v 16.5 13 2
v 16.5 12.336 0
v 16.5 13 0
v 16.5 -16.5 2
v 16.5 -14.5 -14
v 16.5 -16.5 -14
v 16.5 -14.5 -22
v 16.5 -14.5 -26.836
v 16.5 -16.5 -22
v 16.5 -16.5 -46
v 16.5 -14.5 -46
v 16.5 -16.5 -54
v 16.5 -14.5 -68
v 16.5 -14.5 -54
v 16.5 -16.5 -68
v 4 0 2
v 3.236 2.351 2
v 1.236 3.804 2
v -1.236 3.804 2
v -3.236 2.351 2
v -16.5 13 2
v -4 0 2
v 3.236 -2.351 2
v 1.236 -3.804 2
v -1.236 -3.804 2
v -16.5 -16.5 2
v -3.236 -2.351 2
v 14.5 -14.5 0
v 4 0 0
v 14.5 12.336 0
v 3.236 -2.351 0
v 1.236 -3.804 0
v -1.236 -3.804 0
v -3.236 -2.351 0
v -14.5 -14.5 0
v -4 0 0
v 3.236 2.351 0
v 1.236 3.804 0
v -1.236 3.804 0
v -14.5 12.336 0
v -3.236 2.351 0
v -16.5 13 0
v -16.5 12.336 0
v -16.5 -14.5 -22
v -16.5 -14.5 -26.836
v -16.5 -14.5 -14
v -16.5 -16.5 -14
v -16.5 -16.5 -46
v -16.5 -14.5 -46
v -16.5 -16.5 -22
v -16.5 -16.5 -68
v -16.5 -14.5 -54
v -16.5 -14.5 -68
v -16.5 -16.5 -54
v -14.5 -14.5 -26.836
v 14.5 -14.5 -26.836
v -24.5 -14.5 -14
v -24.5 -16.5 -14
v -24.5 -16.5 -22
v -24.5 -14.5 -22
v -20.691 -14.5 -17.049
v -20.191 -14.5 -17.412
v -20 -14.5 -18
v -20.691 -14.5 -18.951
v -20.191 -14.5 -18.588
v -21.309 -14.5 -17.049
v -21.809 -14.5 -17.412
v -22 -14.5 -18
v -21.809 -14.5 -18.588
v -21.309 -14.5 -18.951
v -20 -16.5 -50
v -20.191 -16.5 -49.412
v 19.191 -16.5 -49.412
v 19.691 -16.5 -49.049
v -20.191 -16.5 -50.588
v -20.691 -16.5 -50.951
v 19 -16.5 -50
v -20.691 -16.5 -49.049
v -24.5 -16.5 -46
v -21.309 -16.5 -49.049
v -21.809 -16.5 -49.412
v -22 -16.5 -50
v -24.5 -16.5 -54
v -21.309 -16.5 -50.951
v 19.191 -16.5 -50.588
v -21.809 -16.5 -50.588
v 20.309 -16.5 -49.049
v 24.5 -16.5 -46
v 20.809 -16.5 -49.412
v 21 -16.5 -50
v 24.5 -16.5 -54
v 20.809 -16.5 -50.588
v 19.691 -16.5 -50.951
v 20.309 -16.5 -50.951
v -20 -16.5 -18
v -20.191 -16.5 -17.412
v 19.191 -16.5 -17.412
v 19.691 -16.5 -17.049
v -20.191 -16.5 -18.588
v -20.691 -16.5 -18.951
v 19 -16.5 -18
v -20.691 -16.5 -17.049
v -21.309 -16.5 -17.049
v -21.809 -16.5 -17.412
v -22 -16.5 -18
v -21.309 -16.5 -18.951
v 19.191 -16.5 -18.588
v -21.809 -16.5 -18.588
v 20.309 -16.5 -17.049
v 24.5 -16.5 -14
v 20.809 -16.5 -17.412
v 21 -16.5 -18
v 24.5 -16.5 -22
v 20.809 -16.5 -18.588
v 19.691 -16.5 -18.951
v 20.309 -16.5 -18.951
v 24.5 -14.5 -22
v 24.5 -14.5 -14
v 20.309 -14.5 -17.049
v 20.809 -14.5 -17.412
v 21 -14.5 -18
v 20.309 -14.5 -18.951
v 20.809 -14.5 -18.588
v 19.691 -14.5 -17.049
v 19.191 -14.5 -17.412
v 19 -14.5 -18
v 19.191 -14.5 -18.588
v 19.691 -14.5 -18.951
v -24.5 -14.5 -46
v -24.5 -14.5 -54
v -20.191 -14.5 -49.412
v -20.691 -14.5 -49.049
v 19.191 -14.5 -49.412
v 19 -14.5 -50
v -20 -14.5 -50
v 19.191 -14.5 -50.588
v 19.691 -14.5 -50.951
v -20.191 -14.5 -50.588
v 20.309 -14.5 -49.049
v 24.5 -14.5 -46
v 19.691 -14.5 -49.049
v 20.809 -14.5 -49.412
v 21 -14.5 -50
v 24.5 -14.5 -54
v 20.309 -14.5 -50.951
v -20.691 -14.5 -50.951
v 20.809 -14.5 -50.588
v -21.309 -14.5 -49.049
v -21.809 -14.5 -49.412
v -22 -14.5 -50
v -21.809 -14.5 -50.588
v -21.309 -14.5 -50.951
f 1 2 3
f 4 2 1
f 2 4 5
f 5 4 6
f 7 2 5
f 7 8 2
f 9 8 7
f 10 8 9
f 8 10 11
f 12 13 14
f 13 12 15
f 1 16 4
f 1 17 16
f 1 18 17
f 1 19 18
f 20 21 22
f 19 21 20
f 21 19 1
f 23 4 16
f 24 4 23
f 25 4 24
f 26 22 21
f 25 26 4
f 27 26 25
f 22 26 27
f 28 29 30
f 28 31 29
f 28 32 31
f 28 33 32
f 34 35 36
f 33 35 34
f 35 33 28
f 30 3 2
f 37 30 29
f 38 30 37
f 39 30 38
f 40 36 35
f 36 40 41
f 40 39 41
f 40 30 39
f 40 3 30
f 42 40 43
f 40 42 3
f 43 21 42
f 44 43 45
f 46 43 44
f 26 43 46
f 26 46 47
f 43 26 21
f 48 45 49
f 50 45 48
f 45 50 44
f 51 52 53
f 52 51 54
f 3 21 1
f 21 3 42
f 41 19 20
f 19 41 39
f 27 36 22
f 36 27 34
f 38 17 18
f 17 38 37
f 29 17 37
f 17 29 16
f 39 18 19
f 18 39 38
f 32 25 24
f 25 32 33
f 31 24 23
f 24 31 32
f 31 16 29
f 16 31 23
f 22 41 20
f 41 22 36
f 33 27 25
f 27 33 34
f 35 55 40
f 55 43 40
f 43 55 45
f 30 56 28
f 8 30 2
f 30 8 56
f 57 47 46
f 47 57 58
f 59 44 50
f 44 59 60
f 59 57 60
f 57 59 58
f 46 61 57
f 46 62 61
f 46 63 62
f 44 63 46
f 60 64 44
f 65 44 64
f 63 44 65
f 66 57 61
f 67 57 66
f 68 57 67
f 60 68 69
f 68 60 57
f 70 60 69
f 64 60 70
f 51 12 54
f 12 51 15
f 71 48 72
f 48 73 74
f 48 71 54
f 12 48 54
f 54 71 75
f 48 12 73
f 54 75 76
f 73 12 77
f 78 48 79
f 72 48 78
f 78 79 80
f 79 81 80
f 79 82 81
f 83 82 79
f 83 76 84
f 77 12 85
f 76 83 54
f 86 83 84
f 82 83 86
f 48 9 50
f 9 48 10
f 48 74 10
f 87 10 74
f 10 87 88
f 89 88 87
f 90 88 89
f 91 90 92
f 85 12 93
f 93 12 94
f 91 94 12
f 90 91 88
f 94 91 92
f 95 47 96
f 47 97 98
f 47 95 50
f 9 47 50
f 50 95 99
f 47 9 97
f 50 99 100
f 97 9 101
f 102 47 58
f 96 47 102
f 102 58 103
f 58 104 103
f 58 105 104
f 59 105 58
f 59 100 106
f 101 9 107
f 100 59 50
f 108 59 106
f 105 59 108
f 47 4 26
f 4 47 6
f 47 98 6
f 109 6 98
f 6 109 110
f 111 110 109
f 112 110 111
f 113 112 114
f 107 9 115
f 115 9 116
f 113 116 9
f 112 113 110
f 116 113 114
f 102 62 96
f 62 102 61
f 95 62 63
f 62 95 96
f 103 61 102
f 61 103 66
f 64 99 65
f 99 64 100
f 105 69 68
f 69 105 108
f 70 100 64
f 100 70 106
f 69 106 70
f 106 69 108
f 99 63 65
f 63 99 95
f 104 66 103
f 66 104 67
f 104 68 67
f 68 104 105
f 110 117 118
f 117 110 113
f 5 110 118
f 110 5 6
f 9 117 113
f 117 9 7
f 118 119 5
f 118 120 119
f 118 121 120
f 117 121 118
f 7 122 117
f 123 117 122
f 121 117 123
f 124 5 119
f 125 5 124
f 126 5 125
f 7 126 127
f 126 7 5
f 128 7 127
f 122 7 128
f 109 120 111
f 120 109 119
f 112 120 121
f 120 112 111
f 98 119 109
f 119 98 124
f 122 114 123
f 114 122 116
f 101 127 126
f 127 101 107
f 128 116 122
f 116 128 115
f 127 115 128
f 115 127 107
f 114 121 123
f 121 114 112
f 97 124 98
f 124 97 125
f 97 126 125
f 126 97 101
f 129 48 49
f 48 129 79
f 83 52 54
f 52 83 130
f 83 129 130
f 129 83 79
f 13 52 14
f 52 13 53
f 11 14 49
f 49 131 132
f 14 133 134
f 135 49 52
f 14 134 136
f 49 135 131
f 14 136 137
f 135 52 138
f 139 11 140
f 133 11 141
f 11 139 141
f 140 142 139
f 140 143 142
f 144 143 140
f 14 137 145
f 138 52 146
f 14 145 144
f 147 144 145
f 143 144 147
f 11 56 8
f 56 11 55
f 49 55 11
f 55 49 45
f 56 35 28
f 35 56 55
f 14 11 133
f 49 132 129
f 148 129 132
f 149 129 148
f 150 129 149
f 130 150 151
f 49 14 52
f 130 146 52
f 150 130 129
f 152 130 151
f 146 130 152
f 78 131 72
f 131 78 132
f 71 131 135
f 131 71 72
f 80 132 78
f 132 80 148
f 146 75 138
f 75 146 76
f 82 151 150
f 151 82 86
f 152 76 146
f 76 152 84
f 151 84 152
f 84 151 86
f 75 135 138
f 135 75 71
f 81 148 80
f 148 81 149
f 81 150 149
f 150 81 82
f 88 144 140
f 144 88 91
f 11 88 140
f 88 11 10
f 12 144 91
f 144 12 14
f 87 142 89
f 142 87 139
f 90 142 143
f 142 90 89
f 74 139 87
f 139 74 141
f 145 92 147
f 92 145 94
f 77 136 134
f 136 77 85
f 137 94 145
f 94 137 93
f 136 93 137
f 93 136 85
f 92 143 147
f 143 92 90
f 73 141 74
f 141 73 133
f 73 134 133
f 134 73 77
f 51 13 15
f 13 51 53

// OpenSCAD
$fn = 10;


difference() {
    translate([-(33 / 2), -15, 0]) {
        cube([33, 28, 2]);
    }
    translate([0, 0, -0.01]) {
        cylinder(h = 15, r = 4);
    }
}

rotate([-90, 0, 0]) {
    translate([-(33 / 2), -2, -16.5]) {
        cube([33, 70, 2]);
    }
}

translate([-(33 / 2), -16, -29.75]) {
    difference() {
        cube([2, 29, 30]);
        rotate([-45, 0, 0]) {
            translate([-1, -1, 0]) {
                cube([5, 45, 45]);
            }
       }
    }
}

translate([29 / 2, -16, -29.75]) {
    difference() {
        cube([2, 29, 30]);
        rotate([-45, 0, 0]) {
            translate([-1, -1, 0]) {
                cube([5, 45, 45]);
            }
       }
    }
}

translate([-24.5, -16.5, -22]) {
    difference() {
        cube([8, 2, 8]);
        translate([3.5, 2.5, 4]) {
            rotate([90, 0, 0]) {
                cylinder(h = 3, r = 1);
            }
        }
    }
}

translate([16.5, -16.5, -22]) {
    difference() {
        cube([8, 2, 8]);
        translate([3.5, 2.5, 4]) {
            rotate([90, 0, 0]) {
                cylinder(h = 3, r = 1);
            }
        }
    }
}

translate([-24.5, -16.5, -54]) {
    difference() {
        cube([8, 2, 8]);
        translate([3.5, 2.5, 4]) {
            rotate([90, 0, 0]) {
                cylinder(h = 3, r = 1);
            }
        }
    }
}

translate([16.5, -16.5, -54]) {
    difference() {
        cube([8, 2, 8]);
        translate([3.5, 2.5, 4]) {
            rotate([90, 0, 0]) {
                cylinder(h = 3, r = 1);
            }
        }
    }
}
